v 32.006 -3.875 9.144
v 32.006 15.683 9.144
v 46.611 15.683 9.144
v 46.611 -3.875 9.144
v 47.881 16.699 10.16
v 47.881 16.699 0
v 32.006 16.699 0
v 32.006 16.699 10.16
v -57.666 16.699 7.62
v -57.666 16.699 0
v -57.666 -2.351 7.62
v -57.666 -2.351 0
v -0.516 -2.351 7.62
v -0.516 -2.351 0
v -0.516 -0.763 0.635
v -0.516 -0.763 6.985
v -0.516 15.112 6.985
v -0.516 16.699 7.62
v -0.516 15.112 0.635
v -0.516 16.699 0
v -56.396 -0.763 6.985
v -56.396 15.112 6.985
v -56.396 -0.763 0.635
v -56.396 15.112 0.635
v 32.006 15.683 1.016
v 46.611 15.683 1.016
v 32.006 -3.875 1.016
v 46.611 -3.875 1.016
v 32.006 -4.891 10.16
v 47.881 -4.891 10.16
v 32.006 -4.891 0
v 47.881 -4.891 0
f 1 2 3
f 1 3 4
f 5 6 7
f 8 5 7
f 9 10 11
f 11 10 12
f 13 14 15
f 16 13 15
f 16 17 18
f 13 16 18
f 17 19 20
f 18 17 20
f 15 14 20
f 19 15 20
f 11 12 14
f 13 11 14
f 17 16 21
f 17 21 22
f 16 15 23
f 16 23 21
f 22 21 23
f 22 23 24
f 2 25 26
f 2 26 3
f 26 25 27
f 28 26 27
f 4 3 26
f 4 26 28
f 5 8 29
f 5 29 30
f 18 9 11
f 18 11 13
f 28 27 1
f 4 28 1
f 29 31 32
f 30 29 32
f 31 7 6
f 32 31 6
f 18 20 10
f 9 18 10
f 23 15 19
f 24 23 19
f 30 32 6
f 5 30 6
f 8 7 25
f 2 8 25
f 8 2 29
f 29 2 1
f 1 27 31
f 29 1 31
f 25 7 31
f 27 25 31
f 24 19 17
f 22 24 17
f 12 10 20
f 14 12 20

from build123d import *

# Parameters (mm, degrees)
F1_DEPTH = 7.62
F2_DEPTH = 10.16
F3_W     = 15.875
F3_H     = 6.35
F5_DEPTH = 55.88
F4_W     = 19.558
F4_H     = 8.128
F6_DEPTH = 14.605


with BuildPart() as f1:
    # F0 (on Top) → F1 (new body)
    with BuildSketch(Plane.XY):
        Polygon((-0.516103, 16.699383), (-57.666103, 16.699383), (-57.666103, 7.174383), (-57.666103, -2.350618), (-0.516103, -2.350618), align=None)
    extrude(amount=F1_DEPTH)

    # F3 (on face) → F5 (cut)
    with BuildSketch(Plane.YZ.offset(-0.516103)):
        with Locations((7.174383, 3.81)):
            Rectangle(F3_W, F3_H)
    extrude(amount=-F5_DEPTH, mode=Mode.SUBTRACT)


with BuildPart() as f2:
    # F0 (on Top) → F2 (new body)
    with BuildSketch(Plane.XY):
        Polygon((47.880947, -4.890617), (47.880947, 5.904383), (47.880947, 16.699383), (32.005947, 16.699383), (32.005947, -4.890617), align=None)
    extrude(amount=F2_DEPTH)

    # F4 (on face) → F6 (cut)
    with BuildSketch(Plane(origin=(32.005947, 0, 0), x_dir=(0, -1, 0), z_dir=(-1, 0, 0))):
        with Locations((-5.904383, 5.08)):
            Rectangle(F4_W, F4_H)
    extrude(amount=-F6_DEPTH, mode=Mode.SUBTRACT)


solid = Compound([f1.part, f2.part])
